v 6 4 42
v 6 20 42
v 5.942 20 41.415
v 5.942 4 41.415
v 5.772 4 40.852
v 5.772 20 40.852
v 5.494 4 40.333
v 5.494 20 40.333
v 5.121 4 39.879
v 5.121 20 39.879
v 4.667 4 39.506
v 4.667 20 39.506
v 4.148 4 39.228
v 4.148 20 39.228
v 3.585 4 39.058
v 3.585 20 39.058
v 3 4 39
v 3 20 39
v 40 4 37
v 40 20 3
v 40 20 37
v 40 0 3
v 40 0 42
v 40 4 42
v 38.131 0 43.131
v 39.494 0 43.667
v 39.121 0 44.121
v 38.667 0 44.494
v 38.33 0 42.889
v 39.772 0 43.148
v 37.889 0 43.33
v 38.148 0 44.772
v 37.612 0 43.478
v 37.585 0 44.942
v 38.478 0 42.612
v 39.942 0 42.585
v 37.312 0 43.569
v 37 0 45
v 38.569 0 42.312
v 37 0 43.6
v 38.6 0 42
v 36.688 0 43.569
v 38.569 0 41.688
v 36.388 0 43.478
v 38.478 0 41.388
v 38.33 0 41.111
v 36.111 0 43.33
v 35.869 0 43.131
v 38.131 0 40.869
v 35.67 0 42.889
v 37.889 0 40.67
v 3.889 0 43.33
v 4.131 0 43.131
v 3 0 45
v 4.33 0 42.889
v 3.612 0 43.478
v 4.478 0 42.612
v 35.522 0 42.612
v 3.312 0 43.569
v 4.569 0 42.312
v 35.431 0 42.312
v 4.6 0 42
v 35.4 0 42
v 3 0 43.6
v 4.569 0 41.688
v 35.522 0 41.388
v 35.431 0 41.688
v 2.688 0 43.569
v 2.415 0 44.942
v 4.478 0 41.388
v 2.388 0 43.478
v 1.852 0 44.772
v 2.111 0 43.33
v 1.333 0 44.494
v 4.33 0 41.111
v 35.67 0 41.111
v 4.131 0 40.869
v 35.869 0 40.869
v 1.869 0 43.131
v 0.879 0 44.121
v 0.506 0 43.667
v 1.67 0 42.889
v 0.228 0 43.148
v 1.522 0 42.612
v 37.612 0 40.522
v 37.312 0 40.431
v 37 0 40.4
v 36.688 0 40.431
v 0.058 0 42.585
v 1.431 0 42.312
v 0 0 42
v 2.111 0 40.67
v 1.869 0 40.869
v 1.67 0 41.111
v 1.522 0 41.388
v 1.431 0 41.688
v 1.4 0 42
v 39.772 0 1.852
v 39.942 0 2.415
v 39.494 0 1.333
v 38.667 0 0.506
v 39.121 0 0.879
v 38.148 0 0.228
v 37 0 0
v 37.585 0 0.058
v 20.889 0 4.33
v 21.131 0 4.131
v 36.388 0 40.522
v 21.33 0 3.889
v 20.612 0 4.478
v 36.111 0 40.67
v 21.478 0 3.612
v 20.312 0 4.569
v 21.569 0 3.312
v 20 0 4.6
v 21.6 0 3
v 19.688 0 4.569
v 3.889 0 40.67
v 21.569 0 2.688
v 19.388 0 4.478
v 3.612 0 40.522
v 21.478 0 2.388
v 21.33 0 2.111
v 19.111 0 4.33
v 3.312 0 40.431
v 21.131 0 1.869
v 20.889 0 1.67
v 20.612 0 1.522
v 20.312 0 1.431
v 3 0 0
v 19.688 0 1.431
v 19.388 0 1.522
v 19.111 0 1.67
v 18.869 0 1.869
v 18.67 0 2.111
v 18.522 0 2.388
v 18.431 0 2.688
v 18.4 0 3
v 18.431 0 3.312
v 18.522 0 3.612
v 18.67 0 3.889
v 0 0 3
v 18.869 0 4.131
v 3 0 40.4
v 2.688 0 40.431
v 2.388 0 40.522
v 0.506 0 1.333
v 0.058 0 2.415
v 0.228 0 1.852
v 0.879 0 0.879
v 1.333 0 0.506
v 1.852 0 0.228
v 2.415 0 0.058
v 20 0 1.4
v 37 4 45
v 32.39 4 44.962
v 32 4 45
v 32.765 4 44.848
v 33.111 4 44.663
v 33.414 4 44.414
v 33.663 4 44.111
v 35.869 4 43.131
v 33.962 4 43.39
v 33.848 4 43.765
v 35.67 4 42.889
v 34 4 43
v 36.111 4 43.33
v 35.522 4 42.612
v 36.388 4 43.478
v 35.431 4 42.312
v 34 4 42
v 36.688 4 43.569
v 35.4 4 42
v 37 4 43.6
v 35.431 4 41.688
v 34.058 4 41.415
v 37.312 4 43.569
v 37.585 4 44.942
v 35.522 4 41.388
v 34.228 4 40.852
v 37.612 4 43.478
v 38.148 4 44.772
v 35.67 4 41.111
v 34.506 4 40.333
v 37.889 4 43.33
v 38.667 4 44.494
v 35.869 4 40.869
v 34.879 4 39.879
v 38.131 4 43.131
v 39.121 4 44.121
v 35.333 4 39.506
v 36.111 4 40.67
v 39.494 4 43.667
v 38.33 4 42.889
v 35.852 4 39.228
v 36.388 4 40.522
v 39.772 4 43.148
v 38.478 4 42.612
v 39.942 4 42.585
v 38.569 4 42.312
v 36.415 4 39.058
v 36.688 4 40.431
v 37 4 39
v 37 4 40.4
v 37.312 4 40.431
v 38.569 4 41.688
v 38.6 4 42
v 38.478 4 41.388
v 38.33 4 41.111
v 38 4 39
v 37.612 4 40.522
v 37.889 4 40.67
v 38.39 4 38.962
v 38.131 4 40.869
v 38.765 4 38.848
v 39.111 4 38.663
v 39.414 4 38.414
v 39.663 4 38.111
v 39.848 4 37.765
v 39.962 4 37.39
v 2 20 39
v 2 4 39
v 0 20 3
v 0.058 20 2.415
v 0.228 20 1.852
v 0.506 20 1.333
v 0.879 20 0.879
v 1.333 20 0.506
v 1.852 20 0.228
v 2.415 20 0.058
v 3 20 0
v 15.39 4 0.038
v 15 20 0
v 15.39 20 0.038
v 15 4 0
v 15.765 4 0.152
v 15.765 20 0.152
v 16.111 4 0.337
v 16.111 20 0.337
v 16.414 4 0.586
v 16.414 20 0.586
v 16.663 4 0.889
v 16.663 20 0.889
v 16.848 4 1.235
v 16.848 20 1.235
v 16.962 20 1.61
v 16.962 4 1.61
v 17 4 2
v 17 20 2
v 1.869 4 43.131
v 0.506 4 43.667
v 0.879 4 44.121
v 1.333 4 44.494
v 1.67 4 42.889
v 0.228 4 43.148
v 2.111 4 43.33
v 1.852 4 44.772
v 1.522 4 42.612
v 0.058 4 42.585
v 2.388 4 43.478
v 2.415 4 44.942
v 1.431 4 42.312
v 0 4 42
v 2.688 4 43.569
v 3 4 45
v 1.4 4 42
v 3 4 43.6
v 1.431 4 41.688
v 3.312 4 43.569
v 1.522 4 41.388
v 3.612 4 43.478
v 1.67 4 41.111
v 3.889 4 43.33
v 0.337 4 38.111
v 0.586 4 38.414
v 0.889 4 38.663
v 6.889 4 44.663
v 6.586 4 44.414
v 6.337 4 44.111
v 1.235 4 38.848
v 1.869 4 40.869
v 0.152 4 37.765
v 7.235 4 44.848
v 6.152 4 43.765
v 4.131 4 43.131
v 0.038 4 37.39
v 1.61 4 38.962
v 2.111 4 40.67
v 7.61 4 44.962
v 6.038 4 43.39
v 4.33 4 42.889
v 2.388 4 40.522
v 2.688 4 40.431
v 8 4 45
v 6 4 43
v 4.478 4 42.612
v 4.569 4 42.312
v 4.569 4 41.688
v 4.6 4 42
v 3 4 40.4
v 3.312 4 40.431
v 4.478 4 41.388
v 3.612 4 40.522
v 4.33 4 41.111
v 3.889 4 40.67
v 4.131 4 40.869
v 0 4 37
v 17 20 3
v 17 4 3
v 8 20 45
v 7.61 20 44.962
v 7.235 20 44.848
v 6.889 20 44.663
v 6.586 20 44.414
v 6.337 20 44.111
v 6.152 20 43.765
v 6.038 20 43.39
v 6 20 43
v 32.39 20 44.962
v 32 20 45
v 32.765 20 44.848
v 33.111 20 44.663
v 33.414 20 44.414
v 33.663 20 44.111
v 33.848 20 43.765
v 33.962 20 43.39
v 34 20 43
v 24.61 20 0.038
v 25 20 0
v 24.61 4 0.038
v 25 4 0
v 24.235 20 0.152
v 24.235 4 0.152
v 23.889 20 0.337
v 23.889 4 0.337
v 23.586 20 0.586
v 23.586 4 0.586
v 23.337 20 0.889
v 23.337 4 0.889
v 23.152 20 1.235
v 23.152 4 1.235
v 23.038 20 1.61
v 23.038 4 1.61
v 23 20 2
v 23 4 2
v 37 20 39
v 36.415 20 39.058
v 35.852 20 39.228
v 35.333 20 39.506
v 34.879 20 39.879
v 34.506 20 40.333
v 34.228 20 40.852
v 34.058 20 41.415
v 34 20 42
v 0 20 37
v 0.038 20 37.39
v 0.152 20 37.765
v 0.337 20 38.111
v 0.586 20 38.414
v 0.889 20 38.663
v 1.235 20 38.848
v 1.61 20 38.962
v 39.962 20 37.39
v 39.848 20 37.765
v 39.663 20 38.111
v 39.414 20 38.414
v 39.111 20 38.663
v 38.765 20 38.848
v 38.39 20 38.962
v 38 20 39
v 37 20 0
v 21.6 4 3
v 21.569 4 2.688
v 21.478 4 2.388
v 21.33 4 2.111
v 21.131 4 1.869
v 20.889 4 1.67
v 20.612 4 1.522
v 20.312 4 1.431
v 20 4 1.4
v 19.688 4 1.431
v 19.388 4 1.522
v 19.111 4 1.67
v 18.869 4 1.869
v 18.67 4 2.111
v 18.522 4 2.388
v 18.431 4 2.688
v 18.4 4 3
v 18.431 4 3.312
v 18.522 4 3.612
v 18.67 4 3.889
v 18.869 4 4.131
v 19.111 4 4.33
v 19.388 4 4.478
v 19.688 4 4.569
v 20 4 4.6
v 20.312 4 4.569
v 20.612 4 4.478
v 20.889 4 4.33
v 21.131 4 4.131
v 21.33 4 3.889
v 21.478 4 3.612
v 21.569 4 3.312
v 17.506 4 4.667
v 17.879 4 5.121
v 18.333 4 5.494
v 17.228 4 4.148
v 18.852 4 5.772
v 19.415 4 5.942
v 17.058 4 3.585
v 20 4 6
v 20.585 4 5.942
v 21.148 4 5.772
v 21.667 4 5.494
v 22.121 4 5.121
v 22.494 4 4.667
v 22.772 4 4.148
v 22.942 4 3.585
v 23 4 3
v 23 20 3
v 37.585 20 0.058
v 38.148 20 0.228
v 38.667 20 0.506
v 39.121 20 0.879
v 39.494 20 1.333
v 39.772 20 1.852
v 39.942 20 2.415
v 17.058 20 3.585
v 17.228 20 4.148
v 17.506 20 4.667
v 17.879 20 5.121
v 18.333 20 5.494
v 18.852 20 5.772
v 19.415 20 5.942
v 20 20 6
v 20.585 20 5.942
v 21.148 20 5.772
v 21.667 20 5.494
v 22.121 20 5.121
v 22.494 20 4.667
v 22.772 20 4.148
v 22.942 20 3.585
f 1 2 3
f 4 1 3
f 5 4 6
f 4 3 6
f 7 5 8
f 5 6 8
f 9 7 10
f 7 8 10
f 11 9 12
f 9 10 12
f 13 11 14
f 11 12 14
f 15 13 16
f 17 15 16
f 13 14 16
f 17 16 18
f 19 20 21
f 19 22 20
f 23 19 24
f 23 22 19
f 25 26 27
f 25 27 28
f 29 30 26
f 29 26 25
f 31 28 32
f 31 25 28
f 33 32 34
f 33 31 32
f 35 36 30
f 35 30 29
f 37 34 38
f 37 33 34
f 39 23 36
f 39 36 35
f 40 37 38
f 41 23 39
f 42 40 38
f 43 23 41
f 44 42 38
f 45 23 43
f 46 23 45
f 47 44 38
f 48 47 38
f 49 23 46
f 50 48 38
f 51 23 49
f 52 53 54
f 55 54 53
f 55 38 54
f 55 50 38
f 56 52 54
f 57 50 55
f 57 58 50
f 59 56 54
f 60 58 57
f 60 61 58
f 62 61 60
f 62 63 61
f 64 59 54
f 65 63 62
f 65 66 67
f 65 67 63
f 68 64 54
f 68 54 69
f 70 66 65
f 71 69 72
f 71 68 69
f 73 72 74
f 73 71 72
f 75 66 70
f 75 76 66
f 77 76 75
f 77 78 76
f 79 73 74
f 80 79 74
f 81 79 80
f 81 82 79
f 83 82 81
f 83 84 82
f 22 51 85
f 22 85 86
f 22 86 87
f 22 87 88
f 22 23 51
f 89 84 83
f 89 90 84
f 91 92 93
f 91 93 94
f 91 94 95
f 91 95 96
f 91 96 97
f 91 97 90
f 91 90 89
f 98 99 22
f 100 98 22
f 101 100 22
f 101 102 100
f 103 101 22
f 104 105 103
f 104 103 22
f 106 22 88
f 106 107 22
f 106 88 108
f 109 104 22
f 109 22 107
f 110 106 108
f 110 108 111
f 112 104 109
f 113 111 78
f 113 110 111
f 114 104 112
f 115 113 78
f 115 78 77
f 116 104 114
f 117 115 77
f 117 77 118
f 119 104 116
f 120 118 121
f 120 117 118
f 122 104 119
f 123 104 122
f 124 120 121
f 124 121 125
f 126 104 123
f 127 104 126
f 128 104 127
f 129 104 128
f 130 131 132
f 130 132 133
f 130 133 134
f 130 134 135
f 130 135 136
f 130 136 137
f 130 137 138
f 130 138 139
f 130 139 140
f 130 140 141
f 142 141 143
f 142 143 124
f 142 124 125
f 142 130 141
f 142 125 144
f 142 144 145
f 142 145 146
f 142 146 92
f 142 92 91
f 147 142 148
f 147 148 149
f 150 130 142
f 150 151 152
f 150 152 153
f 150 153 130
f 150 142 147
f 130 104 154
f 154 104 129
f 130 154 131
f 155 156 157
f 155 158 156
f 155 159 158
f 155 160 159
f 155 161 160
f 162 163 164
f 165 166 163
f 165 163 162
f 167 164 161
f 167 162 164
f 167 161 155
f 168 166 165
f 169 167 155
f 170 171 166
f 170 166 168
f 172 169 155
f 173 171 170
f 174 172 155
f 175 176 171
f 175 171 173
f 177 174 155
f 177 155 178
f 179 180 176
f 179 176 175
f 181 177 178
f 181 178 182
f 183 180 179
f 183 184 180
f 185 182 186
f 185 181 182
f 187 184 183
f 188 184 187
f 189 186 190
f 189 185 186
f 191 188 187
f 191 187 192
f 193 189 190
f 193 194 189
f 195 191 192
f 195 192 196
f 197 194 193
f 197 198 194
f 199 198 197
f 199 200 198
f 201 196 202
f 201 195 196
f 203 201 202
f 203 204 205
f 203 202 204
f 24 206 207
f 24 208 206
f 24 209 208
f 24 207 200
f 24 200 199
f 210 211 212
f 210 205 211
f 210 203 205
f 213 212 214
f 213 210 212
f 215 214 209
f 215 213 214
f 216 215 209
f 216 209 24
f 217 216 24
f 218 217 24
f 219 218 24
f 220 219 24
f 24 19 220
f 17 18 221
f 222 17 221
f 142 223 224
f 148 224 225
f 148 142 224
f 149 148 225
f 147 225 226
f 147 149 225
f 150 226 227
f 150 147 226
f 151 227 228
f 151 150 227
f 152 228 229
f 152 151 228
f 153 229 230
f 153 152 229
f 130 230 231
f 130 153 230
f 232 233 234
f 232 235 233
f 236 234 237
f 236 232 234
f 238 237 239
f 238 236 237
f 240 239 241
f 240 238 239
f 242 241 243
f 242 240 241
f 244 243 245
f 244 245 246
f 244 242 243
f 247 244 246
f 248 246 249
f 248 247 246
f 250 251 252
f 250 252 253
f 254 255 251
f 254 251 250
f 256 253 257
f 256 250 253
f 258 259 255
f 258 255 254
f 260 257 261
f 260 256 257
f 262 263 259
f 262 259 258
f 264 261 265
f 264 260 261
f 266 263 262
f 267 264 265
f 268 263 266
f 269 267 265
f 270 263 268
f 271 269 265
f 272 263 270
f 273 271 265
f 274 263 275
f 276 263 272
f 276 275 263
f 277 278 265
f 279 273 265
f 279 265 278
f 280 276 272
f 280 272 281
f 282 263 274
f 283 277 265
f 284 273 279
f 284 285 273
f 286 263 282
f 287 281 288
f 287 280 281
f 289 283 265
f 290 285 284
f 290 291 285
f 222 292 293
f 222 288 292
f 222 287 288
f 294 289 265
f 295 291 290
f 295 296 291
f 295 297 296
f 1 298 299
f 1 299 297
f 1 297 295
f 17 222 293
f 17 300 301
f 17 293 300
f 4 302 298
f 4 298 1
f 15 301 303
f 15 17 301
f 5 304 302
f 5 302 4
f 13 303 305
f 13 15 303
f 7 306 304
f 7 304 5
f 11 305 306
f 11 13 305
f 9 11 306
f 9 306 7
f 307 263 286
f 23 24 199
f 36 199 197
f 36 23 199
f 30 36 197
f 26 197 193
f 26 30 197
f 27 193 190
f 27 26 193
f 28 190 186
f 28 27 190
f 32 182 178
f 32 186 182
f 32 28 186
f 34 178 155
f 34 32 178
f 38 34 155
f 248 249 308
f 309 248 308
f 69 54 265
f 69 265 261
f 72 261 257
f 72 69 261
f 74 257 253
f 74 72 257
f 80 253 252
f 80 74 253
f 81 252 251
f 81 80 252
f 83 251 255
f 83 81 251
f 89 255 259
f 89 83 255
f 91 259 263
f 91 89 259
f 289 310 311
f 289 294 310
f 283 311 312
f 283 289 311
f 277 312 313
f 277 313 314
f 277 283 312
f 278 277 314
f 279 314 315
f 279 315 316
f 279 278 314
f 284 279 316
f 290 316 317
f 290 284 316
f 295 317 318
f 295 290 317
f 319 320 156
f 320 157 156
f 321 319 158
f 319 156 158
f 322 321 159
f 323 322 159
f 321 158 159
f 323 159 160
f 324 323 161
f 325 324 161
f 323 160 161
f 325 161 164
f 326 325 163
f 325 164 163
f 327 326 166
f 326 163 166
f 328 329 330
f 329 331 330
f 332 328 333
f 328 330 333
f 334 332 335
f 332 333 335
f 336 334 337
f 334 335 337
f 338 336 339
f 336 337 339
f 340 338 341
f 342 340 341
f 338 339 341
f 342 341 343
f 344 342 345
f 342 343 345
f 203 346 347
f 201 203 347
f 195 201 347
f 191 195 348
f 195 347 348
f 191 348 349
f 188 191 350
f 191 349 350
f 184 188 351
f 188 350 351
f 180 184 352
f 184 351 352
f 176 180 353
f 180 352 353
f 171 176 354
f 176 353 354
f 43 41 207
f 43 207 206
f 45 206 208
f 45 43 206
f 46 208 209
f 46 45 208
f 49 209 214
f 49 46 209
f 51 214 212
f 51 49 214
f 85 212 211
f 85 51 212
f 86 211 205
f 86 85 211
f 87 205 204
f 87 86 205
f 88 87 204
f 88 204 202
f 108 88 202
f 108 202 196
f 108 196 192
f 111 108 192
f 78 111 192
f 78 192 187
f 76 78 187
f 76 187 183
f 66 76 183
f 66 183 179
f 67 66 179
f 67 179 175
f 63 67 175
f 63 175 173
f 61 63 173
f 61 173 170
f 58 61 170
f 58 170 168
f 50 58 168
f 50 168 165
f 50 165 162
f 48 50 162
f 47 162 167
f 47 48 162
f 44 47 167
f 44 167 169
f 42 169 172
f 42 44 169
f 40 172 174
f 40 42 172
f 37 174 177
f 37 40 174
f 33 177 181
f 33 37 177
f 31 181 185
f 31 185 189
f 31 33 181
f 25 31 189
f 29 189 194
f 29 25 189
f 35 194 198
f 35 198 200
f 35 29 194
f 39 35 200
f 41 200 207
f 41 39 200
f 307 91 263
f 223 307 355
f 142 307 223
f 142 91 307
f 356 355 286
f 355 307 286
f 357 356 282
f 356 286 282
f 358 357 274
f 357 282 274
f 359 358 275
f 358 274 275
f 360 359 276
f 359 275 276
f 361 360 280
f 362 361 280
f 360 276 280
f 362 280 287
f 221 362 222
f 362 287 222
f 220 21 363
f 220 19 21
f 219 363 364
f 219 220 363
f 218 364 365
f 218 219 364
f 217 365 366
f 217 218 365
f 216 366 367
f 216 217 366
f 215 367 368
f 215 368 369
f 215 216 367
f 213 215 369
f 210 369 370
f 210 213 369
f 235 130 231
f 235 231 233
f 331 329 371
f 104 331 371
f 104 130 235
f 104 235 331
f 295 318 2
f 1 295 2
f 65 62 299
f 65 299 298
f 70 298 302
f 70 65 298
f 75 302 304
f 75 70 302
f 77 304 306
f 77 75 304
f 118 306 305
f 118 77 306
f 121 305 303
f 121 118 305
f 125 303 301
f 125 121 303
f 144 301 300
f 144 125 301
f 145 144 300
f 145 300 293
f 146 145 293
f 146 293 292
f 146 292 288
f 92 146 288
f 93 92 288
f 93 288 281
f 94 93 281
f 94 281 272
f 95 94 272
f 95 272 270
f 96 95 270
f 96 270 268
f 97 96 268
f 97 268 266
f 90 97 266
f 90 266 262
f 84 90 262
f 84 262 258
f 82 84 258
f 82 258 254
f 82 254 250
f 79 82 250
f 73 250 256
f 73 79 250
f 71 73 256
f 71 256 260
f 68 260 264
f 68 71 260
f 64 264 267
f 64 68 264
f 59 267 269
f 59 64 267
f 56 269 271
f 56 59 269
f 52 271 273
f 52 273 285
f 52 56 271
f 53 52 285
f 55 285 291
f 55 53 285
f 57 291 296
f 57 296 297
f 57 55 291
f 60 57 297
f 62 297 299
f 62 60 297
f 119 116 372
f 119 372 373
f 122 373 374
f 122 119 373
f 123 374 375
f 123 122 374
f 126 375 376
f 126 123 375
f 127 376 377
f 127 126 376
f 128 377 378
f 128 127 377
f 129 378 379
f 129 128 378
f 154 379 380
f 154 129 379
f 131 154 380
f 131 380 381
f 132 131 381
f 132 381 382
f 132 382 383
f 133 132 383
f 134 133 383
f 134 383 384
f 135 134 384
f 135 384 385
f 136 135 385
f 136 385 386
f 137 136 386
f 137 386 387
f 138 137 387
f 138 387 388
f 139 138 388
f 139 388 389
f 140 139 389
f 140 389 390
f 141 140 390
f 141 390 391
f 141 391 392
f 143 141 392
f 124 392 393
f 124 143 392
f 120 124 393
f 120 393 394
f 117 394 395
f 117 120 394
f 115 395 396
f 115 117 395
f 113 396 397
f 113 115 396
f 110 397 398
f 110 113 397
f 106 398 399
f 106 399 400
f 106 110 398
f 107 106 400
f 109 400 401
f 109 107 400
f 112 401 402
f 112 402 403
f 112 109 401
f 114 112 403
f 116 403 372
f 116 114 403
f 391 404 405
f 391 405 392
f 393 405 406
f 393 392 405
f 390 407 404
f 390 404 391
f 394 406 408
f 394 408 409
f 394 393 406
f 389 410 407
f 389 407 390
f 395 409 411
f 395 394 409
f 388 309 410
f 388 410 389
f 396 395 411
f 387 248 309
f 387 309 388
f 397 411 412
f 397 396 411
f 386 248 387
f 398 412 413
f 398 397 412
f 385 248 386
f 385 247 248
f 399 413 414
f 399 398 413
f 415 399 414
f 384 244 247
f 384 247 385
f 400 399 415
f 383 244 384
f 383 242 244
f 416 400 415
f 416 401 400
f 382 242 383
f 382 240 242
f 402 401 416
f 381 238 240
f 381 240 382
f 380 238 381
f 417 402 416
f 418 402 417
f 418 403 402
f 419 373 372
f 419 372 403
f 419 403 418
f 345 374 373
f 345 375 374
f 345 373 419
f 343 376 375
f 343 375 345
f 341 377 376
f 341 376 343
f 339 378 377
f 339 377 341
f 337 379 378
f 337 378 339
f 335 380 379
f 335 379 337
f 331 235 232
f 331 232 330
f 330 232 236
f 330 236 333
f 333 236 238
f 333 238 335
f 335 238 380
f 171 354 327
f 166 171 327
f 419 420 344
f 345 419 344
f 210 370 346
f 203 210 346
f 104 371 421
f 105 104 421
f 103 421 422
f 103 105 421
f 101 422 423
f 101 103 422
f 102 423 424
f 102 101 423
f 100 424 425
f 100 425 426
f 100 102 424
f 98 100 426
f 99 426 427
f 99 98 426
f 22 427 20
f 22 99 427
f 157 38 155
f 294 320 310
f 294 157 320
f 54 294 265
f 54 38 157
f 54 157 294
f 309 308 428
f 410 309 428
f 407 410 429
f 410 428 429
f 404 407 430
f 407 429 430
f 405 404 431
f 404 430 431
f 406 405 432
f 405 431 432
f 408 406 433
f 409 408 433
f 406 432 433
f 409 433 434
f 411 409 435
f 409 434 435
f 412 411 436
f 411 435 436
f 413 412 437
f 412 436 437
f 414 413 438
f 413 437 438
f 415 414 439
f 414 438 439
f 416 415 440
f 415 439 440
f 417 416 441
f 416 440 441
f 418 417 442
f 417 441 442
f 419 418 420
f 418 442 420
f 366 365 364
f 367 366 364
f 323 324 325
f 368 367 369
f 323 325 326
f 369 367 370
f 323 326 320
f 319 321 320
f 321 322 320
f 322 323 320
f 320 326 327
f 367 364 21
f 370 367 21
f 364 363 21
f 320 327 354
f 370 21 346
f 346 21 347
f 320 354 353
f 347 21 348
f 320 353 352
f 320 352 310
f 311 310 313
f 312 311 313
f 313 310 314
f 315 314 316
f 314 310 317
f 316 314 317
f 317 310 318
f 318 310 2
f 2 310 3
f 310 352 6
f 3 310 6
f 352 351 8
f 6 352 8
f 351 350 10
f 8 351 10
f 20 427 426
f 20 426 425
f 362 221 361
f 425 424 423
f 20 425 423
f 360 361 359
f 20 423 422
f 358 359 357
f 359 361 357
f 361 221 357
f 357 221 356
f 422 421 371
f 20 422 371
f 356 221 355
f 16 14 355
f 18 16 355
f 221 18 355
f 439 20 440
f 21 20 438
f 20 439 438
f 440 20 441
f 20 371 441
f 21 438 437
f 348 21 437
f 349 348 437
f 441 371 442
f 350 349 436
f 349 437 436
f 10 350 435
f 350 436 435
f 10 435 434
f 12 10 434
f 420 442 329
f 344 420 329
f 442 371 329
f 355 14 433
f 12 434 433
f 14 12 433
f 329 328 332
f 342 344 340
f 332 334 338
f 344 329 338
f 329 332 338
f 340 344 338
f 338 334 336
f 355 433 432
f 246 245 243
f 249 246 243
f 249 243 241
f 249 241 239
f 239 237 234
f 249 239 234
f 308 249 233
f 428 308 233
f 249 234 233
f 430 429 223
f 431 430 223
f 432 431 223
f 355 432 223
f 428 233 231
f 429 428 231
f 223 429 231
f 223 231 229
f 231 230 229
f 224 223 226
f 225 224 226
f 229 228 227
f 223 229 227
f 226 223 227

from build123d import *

# Parameters (mm, degrees)
SKETCH_1_R          = 1.6
EXTRUDE_1_DEPTH     = 20
SKETCH_2_R          = 1.6
CUT_EXTRUDE_1_DEPTH = 16
FILLET_1_R          = 2
SKETCH_3_R          = 7
EXTRUDE_2_DEPTH     = 50
SKETCH_4_R          = 7
CUT_EXTRUDE_2_DEPTH = 50


with BuildPart() as part:
    # 草图1 → 凸台-拉伸1 (new body)
    with BuildSketch(Plane(origin=(0, 0, 0), x_dir=(1, 0, 0), z_dir=(0, 1, 0))):
        with BuildLine():
            Line((3, 0), (37, 0))
            ThreePointArc((37, 0), (39.121320344, -0.878679656), (40, -3))
            Line((40, -3), (40, -42))
            ThreePointArc((40, -42), (39.121320344, -44.121320344), (37, -45))
            Line((37, -45), (3, -45))
            ThreePointArc((3, -45), (0.878679656, -44.121320344), (0, -42))
            Line((0, -42), (0, -3))
            ThreePointArc((0, -3), (0.878679656, -0.878679656), (3, 0))
        make_face()
        with Locations((20, -3)):
            Circle(SKETCH_1_R, mode=Mode.SUBTRACT)
        with Locations((3, -42)):
            Circle(SKETCH_1_R, mode=Mode.SUBTRACT)
        with Locations((37, -42)):
            Circle(SKETCH_1_R, mode=Mode.SUBTRACT)
    extrude(amount=EXTRUDE_1_DEPTH)

    # 草图2 → 切除-拉伸1 (cut)
    with BuildSketch(Plane(origin=(0, 20, 0), x_dir=(1, 0, 0), z_dir=(0, 1, 0))):
        with BuildLine():
            Line((40, -42), (40, -39))
            Line((40, -39), (37, -39))
            ThreePointArc((37, -39), (34.878679656, -39.878679656), (34, -42))
            Line((34, -42), (34, -45))
            Line((34, -45), (37, -45))
            ThreePointArc((37, -45), (39.121320344, -44.121320344), (40, -42))
        make_face()
        with Locations((37, -42)):
            Circle(SKETCH_2_R, mode=Mode.SUBTRACT)
        with BuildLine():
            Line((3, -39), (0, -39))
            Line((0, -39), (0, -42))
            ThreePointArc((0, -42), (0.878679656, -44.121320344), (3, -45))
            Line((3, -45), (6, -45))
            Line((6, -45), (6, -42))
            ThreePointArc((6, -42), (5.121320344, -39.878679656), (3, -39))
        make_face()
        with Locations((3, -42)):
            Circle(SKETCH_2_R, mode=Mode.SUBTRACT)
        with BuildLine():
            Line((17, 0), (17, -3))
            ThreePointArc((17, -3), (20, -6), (23, -3))
            Line((23, -3), (23, 0))
            Line((23, 0), (17, 0))
        make_face()
        with Locations((20, -3)):
            Circle(SKETCH_2_R, mode=Mode.SUBTRACT)
    extrude(amount=-CUT_EXTRUDE_1_DEPTH, mode=Mode.SUBTRACT)

    # 圆角1
    fillet_1_edges = [part.edges().sort_by_distance(p)[0] for p in [
        (40, 12, 39),
        (34, 12, 45),
        (6, 12, 45),
        (0, 12, 39),
        (17, 12, 0),
        (23, 12, 0),
    ]]
    fillet(fillet_1_edges, radius=FILLET_1_R)

    # 草图3 → 凸台-拉伸2 (add)
    with BuildSketch(Plane.XY.offset(45)):
        with Locations((20, 10)):
            Circle(SKETCH_3_R)
    extrude(amount=EXTRUDE_2_DEPTH)

    # 草图4 → 切除-拉伸2 (cut)
    with BuildSketch(Plane.XY.offset(95)):
        with Locations((20, 10)):
            Circle(SKETCH_4_R)
    extrude(amount=-CUT_EXTRUDE_2_DEPTH, mode=Mode.SUBTRACT)


solid = part.part
